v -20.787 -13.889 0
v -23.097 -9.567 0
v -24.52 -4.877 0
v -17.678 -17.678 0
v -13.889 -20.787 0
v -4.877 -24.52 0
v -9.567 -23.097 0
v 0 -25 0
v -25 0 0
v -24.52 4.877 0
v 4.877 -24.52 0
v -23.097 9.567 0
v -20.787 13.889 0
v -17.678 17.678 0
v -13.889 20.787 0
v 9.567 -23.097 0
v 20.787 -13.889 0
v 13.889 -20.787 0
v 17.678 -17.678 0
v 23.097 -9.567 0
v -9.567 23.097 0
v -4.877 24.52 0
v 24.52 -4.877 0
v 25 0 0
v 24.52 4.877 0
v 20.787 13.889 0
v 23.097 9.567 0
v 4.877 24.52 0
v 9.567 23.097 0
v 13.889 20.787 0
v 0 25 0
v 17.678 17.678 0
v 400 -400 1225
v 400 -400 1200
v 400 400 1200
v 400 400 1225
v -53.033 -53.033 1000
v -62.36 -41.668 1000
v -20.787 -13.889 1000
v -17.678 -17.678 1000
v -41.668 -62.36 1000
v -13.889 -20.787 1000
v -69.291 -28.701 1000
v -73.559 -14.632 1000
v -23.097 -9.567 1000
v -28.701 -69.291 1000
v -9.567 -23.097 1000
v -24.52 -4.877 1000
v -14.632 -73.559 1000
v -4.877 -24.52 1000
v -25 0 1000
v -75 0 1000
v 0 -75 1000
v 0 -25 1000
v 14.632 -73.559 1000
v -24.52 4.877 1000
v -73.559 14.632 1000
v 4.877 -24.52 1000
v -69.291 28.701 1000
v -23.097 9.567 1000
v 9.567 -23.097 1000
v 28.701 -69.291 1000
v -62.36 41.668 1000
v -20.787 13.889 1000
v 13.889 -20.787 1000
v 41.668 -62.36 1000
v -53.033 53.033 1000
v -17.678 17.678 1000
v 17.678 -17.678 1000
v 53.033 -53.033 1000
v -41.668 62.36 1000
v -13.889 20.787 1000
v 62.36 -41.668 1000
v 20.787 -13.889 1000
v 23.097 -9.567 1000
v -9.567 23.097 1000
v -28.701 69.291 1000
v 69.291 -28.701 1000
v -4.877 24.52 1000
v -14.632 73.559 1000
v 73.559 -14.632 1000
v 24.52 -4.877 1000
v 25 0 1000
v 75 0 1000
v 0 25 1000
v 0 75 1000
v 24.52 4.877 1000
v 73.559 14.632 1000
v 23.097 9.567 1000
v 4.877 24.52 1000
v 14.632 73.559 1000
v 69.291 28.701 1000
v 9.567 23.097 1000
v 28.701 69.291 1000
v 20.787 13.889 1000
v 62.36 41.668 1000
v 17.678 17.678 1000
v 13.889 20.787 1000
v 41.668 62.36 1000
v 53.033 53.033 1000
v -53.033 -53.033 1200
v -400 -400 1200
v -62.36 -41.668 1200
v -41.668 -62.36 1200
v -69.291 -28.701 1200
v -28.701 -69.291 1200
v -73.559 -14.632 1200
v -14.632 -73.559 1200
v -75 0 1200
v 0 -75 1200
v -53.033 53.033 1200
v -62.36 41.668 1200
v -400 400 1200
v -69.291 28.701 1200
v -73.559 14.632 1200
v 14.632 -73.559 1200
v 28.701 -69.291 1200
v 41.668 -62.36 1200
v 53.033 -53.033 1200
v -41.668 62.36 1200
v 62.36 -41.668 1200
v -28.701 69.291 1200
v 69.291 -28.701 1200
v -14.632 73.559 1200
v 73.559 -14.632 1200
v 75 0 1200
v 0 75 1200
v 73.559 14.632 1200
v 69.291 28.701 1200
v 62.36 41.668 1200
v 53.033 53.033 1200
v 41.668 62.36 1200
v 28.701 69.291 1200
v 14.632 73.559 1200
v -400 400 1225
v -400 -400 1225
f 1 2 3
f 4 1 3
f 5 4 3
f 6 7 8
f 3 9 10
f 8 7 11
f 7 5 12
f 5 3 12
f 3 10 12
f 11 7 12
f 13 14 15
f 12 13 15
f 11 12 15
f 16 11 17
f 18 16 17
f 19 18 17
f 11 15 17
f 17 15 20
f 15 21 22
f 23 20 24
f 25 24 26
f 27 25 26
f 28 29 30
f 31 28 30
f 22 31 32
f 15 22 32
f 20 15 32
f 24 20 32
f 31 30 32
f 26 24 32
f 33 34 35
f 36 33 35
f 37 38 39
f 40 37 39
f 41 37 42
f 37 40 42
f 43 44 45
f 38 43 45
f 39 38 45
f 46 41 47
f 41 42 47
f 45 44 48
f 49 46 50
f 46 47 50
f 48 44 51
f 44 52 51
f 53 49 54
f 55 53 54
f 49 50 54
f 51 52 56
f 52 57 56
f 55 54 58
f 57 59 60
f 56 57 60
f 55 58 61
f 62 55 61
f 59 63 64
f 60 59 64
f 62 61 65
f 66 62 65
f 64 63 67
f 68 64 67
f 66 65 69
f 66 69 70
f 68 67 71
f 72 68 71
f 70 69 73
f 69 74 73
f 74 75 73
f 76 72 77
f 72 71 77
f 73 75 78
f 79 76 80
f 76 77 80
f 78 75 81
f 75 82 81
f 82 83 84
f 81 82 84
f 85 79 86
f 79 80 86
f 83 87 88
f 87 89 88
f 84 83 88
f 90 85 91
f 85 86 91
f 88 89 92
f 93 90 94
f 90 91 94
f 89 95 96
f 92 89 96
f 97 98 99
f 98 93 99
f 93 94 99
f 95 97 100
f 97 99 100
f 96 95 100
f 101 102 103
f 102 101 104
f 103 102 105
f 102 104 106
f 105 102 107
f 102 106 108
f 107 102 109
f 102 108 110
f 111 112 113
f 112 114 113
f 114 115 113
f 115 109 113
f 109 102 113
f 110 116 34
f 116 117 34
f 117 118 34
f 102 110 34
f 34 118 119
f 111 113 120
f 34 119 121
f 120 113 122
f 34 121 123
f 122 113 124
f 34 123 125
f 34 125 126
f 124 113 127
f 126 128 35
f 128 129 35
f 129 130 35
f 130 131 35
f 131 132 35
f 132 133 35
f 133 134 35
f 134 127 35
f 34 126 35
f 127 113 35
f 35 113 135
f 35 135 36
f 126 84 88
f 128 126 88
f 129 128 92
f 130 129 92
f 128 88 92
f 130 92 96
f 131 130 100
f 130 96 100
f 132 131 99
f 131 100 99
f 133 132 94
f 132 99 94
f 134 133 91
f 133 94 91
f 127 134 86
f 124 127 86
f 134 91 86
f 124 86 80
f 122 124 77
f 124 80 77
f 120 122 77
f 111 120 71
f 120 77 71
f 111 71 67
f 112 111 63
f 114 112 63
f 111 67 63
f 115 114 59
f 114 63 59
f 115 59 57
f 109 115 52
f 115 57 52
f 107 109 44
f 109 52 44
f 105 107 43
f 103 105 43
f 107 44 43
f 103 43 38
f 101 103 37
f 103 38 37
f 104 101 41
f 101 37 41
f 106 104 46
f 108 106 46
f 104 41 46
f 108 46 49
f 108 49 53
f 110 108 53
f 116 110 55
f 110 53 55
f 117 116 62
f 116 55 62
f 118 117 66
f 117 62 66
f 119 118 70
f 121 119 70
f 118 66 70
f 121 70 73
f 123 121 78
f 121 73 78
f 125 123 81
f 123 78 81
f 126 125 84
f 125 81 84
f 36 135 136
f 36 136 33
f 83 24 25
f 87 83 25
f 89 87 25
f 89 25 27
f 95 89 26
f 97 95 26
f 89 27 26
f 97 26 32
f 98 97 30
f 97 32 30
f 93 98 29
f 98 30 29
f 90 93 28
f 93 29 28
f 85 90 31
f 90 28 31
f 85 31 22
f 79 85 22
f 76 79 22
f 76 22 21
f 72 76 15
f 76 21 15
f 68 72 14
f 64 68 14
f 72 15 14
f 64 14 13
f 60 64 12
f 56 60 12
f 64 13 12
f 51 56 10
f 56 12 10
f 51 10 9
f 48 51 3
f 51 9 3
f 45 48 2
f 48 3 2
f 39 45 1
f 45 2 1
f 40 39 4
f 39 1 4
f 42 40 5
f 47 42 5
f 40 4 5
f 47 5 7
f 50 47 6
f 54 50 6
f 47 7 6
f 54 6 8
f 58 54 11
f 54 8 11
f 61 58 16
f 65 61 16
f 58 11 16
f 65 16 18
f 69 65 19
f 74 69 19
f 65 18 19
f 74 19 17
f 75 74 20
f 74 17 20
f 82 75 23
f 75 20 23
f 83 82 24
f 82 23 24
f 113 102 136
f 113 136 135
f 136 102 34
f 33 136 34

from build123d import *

# Parameters (mm, degrees)
F0_R     = 25
F1_DEPTH = 1000
F2_R     = 75
F2_R_2   = 25
F3_DEPTH = 200
F4_W     = 800
F4_H     = 800
F5_DEPTH = 25


with BuildPart() as f1:
    # F0 (on Top) → F1 (new body)
    with BuildSketch(Plane.XY):
        Circle(F0_R)
    extrude(amount=F1_DEPTH)

    # F2 (on face) → F3 (join)
    with BuildSketch(Plane.XY.offset(1000)):
        Circle(F2_R)
        Circle(F2_R_2, mode=Mode.SUBTRACT)
        Circle(F2_R_2)
    extrude(amount=F3_DEPTH)

    # F4 (on face) → F5 (join)
    with BuildSketch(Plane.XY.offset(1200)):
        Rectangle(F4_W, F4_H)
    extrude(amount=F5_DEPTH)


solid = f1.part
